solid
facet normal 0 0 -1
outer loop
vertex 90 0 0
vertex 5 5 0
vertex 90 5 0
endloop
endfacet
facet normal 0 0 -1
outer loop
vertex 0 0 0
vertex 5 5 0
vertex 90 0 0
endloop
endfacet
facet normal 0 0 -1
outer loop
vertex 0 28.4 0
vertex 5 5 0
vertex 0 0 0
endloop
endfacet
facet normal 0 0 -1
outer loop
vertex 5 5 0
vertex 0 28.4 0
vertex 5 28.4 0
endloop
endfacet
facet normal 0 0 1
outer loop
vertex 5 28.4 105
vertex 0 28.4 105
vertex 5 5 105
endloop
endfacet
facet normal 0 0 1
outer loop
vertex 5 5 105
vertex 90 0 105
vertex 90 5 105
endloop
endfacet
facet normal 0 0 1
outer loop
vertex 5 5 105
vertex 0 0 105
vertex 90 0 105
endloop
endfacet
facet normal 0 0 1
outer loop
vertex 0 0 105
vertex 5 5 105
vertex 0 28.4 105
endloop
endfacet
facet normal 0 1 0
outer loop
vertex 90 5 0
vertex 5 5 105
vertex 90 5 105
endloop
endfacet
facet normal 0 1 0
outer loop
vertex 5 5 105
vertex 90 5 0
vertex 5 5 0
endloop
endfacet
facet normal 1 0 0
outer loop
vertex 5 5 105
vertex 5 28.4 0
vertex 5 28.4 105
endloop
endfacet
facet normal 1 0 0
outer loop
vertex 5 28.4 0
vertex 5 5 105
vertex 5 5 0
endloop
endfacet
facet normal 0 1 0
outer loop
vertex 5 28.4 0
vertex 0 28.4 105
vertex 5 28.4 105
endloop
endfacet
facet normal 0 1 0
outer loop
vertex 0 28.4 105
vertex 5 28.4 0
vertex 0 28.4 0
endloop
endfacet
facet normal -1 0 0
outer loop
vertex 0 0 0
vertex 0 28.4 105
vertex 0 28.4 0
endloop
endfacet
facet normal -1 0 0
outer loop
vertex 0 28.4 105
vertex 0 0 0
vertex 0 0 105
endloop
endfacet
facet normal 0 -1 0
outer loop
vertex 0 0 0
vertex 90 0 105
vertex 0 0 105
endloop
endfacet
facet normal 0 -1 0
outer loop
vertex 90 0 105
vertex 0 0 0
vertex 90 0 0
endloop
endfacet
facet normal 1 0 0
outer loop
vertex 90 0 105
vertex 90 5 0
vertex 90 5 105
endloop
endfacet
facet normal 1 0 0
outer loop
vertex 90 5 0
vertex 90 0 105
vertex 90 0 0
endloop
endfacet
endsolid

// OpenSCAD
// 3D-printable pipette clamp holder for an 18 mm shelf.
// Printed lying on its side: 2-D profile in XY, extruded 105 mm along Z.
// In use: +Y is up, +X points away from the shelf, Z is the 105 mm length.

// ---- Dimensions (mm) ----
shelf_thickness = 18;      // shelf thickness the clamp grips
gap = 18.4;                // opening between jaws (shelf + clearance)
jaw_t = 5;                 // jaw thickness (top & bottom)
spine_w = 5;               // spine thickness (x = 0..5)
spine_h = 28.4;            // spine height (y = 0..28.4)
bottom_jaw_x0 = -25;       // bottom jaw starts at x = -25
bottom_jaw_x1 = 5;         // bottom jaw ends at x = 5
top_jaw_x0 = -25;          // top jaw + arm starts at x = -25
top_jaw_x1 = 65;           // top jaw + arm ends at x = 65
extrude_len = 105;         // length along Z (the 3 pipettes)

// Pipette holes: 20 mm dia, through the arm along Y (vertical in use)
hole_d = 20;
hole_x = 42;               // hole centre in X (inside the arm)
hole_z = [17.5, 52.5, 87.5]; // hole centres along Z

$fn = 64;

// ---- 2-D profile (XY plane) ----
// Spine: x 0..5, y 0..28.4
// Bottom jaw: x -25..5, y 0..5
// Top jaw + arm: x -25..65, y 23.4..28.4
module profile() { union() {
    square([spine_w, spine_h], origin=[0, 0]);
    square([bottom_jaw_x1 - bottom_jaw_x0, jaw_t], origin=[bottom_jaw_x0, 0]);
    square([top_jaw_x1 - top_jaw_x0, jaw_t], origin=[top_jaw_x0, gap]);
} }

// ---- Extrude the profile along Z, then drill the 3 pipette holes ----
difference() {
    linear_extrude(extrude_len) profile();

    for (z = hole_z) {
        // Hole axis is along Y (vertical in use).
        // Cylinder default axis is Z, so rotate 90° about X to point it along Y.
        // Place it so it spans the full arm thickness (y 23.4..28.4) with 1 mm
        // overhang on each side to guarantee a clean cut through the arm.
        translate([hole_x, gap - jaw_t - 1, z])
            rotate([90, 0, 0])
                cylinder(h = jaw_t + 2, d = hole_d, $fn = 64);
    }
}
